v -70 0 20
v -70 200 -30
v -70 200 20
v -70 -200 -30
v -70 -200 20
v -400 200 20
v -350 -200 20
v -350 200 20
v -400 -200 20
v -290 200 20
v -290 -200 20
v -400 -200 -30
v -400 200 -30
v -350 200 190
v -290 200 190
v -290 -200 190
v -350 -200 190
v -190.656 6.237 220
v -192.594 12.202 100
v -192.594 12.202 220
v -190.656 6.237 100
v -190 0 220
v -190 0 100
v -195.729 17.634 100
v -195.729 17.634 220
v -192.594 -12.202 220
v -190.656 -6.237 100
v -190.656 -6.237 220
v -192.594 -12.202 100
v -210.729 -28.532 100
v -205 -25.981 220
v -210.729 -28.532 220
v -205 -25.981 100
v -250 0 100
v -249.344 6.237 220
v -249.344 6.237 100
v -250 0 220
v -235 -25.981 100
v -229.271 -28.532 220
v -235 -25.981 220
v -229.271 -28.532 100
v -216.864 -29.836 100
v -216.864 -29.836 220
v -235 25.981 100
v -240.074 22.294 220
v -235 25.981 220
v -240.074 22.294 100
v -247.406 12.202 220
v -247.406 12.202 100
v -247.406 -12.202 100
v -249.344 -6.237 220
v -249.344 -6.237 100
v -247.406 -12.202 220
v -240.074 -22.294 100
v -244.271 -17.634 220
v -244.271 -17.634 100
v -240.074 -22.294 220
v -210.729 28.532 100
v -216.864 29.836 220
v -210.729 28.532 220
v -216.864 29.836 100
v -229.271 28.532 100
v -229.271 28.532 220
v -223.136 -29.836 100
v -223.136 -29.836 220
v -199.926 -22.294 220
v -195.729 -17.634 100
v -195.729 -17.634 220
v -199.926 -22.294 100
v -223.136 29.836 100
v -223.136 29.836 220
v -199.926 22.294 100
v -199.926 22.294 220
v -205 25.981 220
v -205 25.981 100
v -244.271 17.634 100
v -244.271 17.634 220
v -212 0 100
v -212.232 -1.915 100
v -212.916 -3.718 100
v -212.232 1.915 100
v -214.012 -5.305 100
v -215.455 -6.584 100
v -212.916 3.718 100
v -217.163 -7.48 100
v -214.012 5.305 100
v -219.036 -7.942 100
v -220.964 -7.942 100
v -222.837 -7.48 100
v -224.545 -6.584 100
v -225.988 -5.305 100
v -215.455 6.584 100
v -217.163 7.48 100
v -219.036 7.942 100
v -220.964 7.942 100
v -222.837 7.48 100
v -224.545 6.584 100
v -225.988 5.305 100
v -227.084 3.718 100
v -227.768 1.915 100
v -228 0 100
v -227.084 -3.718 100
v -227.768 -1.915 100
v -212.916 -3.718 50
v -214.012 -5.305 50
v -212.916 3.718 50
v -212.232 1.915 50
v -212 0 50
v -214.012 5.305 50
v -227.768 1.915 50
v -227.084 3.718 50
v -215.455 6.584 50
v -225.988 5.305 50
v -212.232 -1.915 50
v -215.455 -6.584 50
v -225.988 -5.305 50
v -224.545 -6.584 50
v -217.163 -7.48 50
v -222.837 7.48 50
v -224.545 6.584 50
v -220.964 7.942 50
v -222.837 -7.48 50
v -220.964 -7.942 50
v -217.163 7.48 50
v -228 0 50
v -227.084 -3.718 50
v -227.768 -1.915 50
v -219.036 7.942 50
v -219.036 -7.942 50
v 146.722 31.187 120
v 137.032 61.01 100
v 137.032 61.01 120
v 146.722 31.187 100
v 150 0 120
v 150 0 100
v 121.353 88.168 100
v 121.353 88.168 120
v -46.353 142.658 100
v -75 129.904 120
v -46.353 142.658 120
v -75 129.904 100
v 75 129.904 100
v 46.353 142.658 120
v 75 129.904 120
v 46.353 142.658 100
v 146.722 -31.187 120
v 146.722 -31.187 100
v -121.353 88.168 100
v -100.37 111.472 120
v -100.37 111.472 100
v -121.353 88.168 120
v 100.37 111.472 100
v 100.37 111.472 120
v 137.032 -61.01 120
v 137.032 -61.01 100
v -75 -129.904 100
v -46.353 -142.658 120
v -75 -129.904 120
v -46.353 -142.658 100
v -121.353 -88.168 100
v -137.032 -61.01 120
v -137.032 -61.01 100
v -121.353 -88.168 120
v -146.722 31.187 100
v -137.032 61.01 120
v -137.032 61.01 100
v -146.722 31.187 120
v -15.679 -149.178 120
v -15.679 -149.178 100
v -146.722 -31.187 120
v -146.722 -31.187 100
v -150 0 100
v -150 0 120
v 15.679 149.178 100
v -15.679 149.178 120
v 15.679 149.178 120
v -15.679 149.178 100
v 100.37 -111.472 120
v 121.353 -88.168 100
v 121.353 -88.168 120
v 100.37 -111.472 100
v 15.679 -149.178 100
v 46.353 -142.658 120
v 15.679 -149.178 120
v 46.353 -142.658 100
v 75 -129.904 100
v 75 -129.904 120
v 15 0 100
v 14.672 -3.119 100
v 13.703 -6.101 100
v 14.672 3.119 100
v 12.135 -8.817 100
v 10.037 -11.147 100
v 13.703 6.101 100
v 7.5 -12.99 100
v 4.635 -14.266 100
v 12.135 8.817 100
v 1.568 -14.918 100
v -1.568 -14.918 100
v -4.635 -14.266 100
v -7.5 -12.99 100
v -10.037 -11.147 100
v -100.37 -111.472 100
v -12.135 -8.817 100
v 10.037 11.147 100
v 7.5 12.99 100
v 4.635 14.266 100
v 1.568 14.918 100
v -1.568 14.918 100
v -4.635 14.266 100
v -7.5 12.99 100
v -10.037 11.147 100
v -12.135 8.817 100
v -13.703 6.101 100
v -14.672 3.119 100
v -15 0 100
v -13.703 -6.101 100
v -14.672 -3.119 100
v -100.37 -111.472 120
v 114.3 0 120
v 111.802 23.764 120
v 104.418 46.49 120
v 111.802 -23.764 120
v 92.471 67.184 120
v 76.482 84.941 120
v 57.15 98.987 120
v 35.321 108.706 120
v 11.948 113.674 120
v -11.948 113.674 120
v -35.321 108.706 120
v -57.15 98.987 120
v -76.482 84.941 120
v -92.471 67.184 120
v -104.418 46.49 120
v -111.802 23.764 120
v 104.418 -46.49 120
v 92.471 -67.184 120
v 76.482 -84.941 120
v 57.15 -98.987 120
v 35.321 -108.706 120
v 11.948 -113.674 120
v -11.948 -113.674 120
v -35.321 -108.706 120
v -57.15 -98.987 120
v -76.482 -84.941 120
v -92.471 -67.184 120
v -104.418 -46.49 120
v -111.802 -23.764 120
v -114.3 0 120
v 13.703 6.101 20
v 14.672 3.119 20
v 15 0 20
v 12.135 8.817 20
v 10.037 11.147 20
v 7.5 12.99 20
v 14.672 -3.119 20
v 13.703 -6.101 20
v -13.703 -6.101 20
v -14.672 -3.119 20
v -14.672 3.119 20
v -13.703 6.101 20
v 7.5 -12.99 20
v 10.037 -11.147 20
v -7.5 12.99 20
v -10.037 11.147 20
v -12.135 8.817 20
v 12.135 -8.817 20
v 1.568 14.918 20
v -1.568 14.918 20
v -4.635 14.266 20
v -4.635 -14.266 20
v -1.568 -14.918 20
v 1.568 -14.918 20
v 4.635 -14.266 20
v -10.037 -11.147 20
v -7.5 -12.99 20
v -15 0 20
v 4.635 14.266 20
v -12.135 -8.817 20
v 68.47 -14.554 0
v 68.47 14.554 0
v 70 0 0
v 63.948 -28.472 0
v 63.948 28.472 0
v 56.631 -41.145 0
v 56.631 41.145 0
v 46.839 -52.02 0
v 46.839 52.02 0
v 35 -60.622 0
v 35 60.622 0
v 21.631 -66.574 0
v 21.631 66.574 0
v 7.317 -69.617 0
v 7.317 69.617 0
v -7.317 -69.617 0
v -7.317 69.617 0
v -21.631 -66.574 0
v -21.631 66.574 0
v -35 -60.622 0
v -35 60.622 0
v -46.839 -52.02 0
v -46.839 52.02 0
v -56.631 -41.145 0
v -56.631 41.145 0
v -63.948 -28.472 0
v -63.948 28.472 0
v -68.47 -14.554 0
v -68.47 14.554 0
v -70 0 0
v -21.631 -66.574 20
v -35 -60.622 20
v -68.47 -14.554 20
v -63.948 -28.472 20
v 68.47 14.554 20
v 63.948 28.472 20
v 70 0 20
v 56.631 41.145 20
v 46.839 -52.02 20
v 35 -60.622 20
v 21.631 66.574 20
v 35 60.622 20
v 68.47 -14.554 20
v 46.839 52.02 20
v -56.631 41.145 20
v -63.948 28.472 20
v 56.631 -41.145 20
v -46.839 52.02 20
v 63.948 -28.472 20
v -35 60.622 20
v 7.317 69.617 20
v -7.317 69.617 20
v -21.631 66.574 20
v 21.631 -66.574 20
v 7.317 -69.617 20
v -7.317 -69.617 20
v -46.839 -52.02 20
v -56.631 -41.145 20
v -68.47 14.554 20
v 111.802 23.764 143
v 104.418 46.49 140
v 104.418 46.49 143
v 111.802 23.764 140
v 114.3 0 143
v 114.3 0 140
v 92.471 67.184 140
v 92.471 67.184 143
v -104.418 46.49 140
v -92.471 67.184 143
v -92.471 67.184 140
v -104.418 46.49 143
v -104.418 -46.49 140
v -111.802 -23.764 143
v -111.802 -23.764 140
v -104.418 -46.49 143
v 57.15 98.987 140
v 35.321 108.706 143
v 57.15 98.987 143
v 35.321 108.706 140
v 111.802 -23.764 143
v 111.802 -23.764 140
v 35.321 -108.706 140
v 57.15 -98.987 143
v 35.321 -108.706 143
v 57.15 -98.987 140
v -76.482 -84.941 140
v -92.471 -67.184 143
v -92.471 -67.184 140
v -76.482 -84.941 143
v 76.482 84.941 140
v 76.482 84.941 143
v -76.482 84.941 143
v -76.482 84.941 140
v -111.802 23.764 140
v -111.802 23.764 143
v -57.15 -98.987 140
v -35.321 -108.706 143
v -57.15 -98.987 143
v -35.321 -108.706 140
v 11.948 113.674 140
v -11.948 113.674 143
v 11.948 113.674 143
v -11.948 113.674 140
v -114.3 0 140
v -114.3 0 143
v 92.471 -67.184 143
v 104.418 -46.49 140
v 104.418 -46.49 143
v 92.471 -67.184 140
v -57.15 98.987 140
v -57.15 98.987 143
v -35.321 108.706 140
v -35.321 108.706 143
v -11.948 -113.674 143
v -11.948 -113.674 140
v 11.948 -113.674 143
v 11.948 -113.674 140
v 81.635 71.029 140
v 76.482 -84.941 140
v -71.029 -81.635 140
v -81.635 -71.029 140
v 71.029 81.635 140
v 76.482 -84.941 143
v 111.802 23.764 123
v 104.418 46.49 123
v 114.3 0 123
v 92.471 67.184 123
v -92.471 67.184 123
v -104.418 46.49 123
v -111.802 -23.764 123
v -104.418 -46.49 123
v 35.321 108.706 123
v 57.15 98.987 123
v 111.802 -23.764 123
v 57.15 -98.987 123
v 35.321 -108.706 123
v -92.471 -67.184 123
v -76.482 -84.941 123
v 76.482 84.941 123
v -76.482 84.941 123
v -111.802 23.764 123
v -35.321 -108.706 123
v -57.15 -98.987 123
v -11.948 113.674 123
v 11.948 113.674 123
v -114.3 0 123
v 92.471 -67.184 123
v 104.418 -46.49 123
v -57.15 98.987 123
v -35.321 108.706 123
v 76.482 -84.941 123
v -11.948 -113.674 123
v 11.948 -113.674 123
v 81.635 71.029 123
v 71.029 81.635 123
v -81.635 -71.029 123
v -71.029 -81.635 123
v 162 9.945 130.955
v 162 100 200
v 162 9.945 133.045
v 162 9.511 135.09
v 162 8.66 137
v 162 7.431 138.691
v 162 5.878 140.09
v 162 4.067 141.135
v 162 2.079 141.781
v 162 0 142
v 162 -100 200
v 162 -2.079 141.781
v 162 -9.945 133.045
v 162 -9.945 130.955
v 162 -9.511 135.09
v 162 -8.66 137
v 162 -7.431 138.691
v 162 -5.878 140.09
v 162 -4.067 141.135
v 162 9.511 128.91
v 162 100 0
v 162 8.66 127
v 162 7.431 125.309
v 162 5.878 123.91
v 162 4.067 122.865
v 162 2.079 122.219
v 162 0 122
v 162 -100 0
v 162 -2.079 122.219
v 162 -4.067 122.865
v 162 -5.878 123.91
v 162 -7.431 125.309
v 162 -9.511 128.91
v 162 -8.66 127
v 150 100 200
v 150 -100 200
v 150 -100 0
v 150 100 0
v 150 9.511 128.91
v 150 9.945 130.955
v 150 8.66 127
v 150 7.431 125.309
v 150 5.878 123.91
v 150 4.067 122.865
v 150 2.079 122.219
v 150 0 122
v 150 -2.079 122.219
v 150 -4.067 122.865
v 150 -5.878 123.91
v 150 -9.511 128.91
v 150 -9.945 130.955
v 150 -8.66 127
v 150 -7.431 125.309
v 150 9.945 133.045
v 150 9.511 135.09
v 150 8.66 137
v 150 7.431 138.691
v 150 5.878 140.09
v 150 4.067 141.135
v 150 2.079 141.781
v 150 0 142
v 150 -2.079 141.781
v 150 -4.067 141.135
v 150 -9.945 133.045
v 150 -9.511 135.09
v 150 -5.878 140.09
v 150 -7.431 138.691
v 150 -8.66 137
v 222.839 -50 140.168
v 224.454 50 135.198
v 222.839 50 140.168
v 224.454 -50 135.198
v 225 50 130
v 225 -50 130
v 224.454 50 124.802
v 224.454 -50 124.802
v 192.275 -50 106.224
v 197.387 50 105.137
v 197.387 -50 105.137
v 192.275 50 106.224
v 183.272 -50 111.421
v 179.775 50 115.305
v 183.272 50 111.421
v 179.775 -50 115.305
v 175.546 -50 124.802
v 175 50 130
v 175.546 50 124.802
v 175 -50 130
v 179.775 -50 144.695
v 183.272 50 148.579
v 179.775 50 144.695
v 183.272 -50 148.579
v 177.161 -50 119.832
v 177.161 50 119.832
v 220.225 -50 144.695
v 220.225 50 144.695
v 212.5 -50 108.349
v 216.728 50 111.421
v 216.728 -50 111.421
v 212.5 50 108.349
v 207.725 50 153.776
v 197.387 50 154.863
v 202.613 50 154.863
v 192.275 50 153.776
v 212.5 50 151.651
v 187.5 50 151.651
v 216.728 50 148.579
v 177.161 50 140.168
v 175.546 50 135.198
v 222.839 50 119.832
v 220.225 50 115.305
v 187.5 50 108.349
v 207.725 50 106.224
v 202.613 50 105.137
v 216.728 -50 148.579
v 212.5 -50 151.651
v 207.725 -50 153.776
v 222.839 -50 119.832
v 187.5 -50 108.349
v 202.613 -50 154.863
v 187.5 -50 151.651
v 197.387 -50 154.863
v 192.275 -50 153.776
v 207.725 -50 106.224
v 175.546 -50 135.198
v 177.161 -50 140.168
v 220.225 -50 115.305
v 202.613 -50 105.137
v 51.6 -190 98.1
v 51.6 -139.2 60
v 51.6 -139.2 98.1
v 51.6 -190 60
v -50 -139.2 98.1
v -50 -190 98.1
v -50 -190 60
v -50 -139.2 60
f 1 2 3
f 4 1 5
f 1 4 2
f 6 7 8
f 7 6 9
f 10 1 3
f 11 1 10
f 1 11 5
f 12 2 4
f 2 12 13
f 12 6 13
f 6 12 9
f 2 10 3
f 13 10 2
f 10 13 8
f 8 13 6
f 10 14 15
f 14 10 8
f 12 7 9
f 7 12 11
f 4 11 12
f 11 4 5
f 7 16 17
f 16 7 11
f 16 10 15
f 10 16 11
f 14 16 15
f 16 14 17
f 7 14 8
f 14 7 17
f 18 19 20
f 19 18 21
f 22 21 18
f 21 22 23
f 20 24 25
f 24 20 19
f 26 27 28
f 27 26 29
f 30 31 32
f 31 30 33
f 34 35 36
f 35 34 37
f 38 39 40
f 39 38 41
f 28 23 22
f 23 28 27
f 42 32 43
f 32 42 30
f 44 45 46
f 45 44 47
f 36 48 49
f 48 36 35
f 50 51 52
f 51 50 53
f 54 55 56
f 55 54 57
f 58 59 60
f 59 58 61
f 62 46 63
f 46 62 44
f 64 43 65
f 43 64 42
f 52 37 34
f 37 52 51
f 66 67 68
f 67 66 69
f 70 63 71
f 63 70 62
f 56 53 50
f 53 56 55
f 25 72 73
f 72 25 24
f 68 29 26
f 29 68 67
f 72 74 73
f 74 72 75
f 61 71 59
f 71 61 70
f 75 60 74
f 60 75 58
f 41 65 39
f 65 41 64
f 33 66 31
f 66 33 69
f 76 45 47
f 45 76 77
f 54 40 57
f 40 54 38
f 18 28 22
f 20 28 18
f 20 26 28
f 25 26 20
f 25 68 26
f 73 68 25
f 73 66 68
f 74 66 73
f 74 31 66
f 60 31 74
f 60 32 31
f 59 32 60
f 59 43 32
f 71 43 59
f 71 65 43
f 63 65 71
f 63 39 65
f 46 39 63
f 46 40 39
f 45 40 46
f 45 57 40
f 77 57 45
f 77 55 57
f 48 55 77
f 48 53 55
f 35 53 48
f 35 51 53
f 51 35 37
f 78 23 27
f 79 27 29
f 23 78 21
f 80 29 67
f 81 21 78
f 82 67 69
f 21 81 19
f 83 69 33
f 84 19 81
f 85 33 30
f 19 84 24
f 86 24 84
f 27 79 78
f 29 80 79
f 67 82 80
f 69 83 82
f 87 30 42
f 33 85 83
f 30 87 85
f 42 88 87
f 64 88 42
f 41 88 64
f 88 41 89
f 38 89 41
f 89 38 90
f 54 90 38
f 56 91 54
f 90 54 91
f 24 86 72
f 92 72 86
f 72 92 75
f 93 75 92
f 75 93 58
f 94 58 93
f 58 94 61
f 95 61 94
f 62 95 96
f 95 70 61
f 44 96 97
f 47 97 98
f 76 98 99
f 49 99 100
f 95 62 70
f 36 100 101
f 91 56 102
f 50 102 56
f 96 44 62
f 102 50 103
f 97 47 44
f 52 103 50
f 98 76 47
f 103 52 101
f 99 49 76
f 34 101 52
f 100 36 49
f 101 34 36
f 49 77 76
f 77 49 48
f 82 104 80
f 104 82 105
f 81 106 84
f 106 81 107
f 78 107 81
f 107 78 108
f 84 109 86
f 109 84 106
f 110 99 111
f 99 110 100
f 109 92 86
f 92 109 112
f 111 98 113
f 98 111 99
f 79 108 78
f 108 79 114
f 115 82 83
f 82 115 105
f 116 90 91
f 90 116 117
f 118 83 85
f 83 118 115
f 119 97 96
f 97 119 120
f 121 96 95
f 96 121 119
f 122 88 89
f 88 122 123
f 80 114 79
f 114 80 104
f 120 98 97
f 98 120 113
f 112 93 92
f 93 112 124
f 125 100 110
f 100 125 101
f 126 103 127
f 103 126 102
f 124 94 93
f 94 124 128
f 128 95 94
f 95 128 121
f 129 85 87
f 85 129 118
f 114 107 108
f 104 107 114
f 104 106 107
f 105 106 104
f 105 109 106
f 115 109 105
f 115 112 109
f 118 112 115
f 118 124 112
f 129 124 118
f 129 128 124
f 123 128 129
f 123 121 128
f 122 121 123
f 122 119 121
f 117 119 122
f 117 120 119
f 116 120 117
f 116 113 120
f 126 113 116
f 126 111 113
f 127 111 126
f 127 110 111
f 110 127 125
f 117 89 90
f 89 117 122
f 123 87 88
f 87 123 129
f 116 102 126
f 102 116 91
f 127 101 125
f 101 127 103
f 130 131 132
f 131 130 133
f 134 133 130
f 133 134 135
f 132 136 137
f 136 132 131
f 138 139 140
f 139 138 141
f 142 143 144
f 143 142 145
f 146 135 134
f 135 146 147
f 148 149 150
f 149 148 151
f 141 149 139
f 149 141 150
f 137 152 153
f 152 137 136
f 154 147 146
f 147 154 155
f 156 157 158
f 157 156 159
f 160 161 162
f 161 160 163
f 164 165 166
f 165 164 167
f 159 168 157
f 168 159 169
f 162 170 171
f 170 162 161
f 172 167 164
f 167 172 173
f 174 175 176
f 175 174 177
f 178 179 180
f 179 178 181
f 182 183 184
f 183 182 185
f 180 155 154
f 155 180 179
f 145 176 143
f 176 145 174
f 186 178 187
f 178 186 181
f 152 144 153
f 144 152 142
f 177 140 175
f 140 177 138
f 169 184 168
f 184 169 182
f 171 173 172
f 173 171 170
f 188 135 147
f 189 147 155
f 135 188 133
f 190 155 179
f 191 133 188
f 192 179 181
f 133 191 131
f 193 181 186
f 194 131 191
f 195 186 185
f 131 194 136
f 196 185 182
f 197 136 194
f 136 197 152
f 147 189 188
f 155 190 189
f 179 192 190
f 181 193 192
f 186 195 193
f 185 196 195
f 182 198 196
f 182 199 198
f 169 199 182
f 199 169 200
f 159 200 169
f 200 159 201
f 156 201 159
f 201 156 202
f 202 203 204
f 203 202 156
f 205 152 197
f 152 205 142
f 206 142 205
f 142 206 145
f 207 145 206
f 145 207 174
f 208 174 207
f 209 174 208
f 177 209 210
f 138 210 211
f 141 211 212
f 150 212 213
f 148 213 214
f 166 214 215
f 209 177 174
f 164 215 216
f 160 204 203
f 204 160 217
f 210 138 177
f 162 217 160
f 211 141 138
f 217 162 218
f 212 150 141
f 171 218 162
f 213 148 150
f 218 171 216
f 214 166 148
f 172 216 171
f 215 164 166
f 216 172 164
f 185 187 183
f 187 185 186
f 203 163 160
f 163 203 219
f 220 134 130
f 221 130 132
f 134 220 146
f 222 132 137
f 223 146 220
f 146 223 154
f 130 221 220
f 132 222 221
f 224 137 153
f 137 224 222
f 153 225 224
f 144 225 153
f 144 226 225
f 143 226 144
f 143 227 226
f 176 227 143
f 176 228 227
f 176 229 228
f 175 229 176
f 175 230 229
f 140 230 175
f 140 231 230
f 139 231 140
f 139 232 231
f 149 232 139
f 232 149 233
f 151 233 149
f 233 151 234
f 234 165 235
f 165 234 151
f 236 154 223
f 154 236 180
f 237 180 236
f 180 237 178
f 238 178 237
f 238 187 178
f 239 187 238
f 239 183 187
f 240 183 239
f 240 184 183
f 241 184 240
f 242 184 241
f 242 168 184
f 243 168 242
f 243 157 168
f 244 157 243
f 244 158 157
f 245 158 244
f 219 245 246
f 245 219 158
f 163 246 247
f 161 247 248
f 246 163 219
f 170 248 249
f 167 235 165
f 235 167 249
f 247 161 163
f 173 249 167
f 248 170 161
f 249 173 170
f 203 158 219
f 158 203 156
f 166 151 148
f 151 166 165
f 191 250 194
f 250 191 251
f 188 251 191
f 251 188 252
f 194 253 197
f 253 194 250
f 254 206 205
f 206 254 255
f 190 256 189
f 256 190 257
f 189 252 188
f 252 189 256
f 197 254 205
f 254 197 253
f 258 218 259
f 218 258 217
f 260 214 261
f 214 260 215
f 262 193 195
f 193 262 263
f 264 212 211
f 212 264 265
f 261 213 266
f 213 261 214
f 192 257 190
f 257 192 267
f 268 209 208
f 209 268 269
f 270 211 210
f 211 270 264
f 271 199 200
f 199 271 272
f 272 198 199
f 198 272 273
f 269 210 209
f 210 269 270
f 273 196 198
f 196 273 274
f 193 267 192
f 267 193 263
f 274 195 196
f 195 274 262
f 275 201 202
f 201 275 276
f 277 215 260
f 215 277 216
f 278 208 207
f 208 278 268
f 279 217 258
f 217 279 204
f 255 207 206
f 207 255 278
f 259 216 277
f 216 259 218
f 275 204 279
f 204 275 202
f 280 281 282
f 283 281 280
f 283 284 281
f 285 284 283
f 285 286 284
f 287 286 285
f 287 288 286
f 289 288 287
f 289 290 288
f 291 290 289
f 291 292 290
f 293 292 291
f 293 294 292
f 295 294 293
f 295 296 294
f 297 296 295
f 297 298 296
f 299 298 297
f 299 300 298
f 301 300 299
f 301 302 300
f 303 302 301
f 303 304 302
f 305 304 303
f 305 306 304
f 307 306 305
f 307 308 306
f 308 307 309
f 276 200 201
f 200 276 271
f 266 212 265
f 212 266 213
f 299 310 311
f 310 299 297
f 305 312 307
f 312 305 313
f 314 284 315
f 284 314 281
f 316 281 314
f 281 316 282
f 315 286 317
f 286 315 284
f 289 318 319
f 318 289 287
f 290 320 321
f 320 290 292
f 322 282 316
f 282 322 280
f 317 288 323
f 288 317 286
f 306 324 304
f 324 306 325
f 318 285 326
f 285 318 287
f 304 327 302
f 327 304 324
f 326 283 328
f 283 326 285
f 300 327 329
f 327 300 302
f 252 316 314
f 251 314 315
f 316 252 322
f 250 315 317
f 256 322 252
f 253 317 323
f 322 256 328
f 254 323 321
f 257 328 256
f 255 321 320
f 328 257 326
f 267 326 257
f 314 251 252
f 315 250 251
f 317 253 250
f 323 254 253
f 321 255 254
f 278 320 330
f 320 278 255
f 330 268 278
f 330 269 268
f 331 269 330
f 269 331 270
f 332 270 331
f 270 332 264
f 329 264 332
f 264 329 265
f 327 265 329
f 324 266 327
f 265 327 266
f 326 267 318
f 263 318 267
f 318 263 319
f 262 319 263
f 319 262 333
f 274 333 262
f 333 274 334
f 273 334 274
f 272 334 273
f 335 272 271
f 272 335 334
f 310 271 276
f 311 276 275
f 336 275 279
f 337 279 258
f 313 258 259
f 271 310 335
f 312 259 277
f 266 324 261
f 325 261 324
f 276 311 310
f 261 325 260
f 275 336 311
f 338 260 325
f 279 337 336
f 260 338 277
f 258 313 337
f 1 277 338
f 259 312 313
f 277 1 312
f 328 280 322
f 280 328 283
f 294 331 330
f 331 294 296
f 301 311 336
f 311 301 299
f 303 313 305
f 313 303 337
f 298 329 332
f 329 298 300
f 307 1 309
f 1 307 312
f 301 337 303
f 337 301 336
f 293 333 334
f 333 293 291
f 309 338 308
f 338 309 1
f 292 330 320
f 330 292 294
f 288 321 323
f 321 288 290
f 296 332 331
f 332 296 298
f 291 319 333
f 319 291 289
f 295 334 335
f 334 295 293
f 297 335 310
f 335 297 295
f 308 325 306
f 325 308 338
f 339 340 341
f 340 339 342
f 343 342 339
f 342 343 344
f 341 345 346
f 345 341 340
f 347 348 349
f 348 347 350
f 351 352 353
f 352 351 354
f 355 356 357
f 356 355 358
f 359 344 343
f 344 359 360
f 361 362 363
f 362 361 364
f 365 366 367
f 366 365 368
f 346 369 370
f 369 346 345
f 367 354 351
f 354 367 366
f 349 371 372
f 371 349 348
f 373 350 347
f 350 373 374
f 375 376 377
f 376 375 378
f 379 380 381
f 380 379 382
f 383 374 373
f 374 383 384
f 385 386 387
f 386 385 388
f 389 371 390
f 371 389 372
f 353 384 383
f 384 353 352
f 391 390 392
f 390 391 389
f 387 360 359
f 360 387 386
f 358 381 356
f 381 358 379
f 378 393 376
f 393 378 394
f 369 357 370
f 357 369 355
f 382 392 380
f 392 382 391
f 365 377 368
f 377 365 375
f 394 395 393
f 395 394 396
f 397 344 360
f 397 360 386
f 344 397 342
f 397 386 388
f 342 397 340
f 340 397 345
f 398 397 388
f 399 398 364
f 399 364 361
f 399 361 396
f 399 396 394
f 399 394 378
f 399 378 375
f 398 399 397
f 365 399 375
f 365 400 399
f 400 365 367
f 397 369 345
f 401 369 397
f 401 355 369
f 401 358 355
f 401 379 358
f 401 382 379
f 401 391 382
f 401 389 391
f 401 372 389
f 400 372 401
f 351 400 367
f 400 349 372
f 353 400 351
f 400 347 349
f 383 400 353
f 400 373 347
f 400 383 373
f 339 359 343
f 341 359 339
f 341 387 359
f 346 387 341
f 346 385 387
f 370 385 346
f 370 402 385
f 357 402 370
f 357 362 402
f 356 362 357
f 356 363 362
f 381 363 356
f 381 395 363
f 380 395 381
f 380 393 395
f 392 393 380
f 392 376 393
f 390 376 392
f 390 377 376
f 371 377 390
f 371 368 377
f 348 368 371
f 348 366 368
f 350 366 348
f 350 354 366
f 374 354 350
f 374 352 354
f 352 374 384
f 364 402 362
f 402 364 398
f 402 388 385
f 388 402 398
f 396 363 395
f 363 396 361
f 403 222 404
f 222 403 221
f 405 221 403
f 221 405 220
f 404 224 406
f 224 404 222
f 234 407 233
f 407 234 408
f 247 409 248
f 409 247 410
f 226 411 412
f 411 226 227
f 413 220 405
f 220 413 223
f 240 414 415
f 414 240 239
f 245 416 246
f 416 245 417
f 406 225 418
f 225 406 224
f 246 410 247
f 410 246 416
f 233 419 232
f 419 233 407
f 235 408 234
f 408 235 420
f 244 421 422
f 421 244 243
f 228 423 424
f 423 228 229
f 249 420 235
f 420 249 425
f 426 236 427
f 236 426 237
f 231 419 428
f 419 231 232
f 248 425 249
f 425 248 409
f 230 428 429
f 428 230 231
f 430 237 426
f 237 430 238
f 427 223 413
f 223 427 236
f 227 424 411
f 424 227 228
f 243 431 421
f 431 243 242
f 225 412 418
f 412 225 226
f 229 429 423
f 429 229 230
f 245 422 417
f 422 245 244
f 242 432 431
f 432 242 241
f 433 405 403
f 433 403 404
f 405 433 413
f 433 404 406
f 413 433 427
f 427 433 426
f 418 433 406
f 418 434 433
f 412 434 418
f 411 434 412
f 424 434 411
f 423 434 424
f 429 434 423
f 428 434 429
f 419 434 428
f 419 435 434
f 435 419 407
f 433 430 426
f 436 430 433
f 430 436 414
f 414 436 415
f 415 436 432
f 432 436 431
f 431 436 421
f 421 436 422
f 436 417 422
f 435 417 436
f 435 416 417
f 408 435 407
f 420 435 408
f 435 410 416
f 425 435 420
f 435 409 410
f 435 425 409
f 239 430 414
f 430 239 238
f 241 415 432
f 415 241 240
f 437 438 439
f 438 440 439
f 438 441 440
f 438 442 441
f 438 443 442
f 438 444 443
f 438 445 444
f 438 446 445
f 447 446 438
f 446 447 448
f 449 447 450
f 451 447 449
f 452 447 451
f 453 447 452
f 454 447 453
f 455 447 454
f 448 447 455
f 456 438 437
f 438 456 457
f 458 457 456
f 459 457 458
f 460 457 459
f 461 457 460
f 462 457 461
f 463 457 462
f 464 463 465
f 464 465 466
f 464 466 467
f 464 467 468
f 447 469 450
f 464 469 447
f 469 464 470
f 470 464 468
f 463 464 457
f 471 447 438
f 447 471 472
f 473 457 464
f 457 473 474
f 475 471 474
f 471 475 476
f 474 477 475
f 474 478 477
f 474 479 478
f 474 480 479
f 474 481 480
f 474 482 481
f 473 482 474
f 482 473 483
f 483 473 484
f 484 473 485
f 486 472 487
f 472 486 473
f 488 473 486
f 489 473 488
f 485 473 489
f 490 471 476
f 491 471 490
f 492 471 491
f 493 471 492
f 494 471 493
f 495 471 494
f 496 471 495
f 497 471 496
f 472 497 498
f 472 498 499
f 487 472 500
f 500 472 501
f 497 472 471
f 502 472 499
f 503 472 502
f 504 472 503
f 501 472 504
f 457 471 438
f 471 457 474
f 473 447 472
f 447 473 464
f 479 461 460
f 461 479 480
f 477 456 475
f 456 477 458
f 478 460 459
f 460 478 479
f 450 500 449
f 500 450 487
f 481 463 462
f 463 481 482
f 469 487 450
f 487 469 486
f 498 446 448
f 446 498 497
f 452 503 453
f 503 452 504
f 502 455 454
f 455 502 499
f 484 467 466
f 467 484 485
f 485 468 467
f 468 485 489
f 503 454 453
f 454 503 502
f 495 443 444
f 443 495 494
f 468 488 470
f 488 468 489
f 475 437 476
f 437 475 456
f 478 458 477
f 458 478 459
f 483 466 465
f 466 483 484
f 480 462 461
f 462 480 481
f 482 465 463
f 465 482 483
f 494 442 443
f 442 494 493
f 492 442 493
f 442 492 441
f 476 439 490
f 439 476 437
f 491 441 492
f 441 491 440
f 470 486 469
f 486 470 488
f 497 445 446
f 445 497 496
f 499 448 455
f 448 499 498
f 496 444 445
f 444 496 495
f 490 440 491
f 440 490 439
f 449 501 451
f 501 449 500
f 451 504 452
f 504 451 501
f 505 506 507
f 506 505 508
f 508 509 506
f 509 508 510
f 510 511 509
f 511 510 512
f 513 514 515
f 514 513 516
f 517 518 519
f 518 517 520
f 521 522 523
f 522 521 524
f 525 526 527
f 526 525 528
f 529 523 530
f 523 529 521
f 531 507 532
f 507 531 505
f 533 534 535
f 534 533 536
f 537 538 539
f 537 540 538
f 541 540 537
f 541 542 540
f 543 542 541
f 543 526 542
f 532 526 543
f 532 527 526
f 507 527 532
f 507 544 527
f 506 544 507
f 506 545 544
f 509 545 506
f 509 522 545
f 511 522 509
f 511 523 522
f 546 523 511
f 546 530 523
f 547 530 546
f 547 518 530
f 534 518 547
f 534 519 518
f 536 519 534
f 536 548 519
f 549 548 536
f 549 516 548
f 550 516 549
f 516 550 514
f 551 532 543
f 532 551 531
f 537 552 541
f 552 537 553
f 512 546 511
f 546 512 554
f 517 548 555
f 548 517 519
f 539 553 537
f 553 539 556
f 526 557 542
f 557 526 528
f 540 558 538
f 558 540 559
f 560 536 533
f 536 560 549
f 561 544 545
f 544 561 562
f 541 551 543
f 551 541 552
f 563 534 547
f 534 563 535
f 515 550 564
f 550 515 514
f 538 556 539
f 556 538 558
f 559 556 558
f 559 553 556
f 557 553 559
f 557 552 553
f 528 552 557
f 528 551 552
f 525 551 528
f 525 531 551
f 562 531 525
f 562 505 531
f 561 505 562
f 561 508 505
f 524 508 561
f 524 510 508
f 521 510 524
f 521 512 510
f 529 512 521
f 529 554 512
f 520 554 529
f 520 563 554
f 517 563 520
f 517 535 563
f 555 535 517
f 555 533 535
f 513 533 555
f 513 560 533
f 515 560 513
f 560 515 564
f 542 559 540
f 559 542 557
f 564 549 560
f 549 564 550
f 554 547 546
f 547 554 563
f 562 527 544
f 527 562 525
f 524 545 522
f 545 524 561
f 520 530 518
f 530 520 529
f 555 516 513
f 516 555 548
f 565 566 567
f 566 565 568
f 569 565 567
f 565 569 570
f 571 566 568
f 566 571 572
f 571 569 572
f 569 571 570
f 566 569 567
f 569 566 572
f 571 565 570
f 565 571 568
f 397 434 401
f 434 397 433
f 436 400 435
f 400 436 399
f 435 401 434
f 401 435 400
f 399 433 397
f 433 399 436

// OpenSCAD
color("gray",alpha=0.8) translate([-400,-200,-30]) cnc();
color("gray",alpha=0.8) translate([0,0,0]) turntable();
color("orange",alpha=0.8) translate([200,0,130]) spool();
color("blue",alpha=0.8) translate([-50,-190,60]) counter();
color("orange",alpha=0.8) translate([0,0,130]) bobbin();
color("brown",alpha=0.8) translate([0,0,0]) guards();
color("brown",alpha=0.8) translate([150,-100,0]) baffle();

module cnc(){
    cube([330,400,50]);
    translate([50,0,0]) cube([60,400,220]);
    translate([180,200,130]) cylinder(120,30,30);
    translate([180,200,130-50]) cylinder(120,8,8);
}

module turntable(){
    translate([0,0,100]) cylinder(20,150,150);
    cylinder(120,15,15);
    cylinder(20,70,70);
}

module spool(){
    translate([0,50,0]) rotate([90,0,0]) cylinder(100,25,25);
}

module counter(){
    cube([4*25.4,2*25.4,1.5*25.4]);
}

module bobbin(){
    rotate([0,0,45]) cube([8.5*25.4,15,20],center=true);
}

module guards(){
    translate([0,0,100+20+20]) cylinder(3,4.5*25.4,4.5*25.4);
    translate([0,0,100+20]) cylinder(3,4.5*25.4,4.5*25.4);
}

module baffle(){
    difference(){
        cube([12,200,200]);
        translate([-2,100,132]) rotate([0,90,0]) cylinder(20,10,10);
    }
}
